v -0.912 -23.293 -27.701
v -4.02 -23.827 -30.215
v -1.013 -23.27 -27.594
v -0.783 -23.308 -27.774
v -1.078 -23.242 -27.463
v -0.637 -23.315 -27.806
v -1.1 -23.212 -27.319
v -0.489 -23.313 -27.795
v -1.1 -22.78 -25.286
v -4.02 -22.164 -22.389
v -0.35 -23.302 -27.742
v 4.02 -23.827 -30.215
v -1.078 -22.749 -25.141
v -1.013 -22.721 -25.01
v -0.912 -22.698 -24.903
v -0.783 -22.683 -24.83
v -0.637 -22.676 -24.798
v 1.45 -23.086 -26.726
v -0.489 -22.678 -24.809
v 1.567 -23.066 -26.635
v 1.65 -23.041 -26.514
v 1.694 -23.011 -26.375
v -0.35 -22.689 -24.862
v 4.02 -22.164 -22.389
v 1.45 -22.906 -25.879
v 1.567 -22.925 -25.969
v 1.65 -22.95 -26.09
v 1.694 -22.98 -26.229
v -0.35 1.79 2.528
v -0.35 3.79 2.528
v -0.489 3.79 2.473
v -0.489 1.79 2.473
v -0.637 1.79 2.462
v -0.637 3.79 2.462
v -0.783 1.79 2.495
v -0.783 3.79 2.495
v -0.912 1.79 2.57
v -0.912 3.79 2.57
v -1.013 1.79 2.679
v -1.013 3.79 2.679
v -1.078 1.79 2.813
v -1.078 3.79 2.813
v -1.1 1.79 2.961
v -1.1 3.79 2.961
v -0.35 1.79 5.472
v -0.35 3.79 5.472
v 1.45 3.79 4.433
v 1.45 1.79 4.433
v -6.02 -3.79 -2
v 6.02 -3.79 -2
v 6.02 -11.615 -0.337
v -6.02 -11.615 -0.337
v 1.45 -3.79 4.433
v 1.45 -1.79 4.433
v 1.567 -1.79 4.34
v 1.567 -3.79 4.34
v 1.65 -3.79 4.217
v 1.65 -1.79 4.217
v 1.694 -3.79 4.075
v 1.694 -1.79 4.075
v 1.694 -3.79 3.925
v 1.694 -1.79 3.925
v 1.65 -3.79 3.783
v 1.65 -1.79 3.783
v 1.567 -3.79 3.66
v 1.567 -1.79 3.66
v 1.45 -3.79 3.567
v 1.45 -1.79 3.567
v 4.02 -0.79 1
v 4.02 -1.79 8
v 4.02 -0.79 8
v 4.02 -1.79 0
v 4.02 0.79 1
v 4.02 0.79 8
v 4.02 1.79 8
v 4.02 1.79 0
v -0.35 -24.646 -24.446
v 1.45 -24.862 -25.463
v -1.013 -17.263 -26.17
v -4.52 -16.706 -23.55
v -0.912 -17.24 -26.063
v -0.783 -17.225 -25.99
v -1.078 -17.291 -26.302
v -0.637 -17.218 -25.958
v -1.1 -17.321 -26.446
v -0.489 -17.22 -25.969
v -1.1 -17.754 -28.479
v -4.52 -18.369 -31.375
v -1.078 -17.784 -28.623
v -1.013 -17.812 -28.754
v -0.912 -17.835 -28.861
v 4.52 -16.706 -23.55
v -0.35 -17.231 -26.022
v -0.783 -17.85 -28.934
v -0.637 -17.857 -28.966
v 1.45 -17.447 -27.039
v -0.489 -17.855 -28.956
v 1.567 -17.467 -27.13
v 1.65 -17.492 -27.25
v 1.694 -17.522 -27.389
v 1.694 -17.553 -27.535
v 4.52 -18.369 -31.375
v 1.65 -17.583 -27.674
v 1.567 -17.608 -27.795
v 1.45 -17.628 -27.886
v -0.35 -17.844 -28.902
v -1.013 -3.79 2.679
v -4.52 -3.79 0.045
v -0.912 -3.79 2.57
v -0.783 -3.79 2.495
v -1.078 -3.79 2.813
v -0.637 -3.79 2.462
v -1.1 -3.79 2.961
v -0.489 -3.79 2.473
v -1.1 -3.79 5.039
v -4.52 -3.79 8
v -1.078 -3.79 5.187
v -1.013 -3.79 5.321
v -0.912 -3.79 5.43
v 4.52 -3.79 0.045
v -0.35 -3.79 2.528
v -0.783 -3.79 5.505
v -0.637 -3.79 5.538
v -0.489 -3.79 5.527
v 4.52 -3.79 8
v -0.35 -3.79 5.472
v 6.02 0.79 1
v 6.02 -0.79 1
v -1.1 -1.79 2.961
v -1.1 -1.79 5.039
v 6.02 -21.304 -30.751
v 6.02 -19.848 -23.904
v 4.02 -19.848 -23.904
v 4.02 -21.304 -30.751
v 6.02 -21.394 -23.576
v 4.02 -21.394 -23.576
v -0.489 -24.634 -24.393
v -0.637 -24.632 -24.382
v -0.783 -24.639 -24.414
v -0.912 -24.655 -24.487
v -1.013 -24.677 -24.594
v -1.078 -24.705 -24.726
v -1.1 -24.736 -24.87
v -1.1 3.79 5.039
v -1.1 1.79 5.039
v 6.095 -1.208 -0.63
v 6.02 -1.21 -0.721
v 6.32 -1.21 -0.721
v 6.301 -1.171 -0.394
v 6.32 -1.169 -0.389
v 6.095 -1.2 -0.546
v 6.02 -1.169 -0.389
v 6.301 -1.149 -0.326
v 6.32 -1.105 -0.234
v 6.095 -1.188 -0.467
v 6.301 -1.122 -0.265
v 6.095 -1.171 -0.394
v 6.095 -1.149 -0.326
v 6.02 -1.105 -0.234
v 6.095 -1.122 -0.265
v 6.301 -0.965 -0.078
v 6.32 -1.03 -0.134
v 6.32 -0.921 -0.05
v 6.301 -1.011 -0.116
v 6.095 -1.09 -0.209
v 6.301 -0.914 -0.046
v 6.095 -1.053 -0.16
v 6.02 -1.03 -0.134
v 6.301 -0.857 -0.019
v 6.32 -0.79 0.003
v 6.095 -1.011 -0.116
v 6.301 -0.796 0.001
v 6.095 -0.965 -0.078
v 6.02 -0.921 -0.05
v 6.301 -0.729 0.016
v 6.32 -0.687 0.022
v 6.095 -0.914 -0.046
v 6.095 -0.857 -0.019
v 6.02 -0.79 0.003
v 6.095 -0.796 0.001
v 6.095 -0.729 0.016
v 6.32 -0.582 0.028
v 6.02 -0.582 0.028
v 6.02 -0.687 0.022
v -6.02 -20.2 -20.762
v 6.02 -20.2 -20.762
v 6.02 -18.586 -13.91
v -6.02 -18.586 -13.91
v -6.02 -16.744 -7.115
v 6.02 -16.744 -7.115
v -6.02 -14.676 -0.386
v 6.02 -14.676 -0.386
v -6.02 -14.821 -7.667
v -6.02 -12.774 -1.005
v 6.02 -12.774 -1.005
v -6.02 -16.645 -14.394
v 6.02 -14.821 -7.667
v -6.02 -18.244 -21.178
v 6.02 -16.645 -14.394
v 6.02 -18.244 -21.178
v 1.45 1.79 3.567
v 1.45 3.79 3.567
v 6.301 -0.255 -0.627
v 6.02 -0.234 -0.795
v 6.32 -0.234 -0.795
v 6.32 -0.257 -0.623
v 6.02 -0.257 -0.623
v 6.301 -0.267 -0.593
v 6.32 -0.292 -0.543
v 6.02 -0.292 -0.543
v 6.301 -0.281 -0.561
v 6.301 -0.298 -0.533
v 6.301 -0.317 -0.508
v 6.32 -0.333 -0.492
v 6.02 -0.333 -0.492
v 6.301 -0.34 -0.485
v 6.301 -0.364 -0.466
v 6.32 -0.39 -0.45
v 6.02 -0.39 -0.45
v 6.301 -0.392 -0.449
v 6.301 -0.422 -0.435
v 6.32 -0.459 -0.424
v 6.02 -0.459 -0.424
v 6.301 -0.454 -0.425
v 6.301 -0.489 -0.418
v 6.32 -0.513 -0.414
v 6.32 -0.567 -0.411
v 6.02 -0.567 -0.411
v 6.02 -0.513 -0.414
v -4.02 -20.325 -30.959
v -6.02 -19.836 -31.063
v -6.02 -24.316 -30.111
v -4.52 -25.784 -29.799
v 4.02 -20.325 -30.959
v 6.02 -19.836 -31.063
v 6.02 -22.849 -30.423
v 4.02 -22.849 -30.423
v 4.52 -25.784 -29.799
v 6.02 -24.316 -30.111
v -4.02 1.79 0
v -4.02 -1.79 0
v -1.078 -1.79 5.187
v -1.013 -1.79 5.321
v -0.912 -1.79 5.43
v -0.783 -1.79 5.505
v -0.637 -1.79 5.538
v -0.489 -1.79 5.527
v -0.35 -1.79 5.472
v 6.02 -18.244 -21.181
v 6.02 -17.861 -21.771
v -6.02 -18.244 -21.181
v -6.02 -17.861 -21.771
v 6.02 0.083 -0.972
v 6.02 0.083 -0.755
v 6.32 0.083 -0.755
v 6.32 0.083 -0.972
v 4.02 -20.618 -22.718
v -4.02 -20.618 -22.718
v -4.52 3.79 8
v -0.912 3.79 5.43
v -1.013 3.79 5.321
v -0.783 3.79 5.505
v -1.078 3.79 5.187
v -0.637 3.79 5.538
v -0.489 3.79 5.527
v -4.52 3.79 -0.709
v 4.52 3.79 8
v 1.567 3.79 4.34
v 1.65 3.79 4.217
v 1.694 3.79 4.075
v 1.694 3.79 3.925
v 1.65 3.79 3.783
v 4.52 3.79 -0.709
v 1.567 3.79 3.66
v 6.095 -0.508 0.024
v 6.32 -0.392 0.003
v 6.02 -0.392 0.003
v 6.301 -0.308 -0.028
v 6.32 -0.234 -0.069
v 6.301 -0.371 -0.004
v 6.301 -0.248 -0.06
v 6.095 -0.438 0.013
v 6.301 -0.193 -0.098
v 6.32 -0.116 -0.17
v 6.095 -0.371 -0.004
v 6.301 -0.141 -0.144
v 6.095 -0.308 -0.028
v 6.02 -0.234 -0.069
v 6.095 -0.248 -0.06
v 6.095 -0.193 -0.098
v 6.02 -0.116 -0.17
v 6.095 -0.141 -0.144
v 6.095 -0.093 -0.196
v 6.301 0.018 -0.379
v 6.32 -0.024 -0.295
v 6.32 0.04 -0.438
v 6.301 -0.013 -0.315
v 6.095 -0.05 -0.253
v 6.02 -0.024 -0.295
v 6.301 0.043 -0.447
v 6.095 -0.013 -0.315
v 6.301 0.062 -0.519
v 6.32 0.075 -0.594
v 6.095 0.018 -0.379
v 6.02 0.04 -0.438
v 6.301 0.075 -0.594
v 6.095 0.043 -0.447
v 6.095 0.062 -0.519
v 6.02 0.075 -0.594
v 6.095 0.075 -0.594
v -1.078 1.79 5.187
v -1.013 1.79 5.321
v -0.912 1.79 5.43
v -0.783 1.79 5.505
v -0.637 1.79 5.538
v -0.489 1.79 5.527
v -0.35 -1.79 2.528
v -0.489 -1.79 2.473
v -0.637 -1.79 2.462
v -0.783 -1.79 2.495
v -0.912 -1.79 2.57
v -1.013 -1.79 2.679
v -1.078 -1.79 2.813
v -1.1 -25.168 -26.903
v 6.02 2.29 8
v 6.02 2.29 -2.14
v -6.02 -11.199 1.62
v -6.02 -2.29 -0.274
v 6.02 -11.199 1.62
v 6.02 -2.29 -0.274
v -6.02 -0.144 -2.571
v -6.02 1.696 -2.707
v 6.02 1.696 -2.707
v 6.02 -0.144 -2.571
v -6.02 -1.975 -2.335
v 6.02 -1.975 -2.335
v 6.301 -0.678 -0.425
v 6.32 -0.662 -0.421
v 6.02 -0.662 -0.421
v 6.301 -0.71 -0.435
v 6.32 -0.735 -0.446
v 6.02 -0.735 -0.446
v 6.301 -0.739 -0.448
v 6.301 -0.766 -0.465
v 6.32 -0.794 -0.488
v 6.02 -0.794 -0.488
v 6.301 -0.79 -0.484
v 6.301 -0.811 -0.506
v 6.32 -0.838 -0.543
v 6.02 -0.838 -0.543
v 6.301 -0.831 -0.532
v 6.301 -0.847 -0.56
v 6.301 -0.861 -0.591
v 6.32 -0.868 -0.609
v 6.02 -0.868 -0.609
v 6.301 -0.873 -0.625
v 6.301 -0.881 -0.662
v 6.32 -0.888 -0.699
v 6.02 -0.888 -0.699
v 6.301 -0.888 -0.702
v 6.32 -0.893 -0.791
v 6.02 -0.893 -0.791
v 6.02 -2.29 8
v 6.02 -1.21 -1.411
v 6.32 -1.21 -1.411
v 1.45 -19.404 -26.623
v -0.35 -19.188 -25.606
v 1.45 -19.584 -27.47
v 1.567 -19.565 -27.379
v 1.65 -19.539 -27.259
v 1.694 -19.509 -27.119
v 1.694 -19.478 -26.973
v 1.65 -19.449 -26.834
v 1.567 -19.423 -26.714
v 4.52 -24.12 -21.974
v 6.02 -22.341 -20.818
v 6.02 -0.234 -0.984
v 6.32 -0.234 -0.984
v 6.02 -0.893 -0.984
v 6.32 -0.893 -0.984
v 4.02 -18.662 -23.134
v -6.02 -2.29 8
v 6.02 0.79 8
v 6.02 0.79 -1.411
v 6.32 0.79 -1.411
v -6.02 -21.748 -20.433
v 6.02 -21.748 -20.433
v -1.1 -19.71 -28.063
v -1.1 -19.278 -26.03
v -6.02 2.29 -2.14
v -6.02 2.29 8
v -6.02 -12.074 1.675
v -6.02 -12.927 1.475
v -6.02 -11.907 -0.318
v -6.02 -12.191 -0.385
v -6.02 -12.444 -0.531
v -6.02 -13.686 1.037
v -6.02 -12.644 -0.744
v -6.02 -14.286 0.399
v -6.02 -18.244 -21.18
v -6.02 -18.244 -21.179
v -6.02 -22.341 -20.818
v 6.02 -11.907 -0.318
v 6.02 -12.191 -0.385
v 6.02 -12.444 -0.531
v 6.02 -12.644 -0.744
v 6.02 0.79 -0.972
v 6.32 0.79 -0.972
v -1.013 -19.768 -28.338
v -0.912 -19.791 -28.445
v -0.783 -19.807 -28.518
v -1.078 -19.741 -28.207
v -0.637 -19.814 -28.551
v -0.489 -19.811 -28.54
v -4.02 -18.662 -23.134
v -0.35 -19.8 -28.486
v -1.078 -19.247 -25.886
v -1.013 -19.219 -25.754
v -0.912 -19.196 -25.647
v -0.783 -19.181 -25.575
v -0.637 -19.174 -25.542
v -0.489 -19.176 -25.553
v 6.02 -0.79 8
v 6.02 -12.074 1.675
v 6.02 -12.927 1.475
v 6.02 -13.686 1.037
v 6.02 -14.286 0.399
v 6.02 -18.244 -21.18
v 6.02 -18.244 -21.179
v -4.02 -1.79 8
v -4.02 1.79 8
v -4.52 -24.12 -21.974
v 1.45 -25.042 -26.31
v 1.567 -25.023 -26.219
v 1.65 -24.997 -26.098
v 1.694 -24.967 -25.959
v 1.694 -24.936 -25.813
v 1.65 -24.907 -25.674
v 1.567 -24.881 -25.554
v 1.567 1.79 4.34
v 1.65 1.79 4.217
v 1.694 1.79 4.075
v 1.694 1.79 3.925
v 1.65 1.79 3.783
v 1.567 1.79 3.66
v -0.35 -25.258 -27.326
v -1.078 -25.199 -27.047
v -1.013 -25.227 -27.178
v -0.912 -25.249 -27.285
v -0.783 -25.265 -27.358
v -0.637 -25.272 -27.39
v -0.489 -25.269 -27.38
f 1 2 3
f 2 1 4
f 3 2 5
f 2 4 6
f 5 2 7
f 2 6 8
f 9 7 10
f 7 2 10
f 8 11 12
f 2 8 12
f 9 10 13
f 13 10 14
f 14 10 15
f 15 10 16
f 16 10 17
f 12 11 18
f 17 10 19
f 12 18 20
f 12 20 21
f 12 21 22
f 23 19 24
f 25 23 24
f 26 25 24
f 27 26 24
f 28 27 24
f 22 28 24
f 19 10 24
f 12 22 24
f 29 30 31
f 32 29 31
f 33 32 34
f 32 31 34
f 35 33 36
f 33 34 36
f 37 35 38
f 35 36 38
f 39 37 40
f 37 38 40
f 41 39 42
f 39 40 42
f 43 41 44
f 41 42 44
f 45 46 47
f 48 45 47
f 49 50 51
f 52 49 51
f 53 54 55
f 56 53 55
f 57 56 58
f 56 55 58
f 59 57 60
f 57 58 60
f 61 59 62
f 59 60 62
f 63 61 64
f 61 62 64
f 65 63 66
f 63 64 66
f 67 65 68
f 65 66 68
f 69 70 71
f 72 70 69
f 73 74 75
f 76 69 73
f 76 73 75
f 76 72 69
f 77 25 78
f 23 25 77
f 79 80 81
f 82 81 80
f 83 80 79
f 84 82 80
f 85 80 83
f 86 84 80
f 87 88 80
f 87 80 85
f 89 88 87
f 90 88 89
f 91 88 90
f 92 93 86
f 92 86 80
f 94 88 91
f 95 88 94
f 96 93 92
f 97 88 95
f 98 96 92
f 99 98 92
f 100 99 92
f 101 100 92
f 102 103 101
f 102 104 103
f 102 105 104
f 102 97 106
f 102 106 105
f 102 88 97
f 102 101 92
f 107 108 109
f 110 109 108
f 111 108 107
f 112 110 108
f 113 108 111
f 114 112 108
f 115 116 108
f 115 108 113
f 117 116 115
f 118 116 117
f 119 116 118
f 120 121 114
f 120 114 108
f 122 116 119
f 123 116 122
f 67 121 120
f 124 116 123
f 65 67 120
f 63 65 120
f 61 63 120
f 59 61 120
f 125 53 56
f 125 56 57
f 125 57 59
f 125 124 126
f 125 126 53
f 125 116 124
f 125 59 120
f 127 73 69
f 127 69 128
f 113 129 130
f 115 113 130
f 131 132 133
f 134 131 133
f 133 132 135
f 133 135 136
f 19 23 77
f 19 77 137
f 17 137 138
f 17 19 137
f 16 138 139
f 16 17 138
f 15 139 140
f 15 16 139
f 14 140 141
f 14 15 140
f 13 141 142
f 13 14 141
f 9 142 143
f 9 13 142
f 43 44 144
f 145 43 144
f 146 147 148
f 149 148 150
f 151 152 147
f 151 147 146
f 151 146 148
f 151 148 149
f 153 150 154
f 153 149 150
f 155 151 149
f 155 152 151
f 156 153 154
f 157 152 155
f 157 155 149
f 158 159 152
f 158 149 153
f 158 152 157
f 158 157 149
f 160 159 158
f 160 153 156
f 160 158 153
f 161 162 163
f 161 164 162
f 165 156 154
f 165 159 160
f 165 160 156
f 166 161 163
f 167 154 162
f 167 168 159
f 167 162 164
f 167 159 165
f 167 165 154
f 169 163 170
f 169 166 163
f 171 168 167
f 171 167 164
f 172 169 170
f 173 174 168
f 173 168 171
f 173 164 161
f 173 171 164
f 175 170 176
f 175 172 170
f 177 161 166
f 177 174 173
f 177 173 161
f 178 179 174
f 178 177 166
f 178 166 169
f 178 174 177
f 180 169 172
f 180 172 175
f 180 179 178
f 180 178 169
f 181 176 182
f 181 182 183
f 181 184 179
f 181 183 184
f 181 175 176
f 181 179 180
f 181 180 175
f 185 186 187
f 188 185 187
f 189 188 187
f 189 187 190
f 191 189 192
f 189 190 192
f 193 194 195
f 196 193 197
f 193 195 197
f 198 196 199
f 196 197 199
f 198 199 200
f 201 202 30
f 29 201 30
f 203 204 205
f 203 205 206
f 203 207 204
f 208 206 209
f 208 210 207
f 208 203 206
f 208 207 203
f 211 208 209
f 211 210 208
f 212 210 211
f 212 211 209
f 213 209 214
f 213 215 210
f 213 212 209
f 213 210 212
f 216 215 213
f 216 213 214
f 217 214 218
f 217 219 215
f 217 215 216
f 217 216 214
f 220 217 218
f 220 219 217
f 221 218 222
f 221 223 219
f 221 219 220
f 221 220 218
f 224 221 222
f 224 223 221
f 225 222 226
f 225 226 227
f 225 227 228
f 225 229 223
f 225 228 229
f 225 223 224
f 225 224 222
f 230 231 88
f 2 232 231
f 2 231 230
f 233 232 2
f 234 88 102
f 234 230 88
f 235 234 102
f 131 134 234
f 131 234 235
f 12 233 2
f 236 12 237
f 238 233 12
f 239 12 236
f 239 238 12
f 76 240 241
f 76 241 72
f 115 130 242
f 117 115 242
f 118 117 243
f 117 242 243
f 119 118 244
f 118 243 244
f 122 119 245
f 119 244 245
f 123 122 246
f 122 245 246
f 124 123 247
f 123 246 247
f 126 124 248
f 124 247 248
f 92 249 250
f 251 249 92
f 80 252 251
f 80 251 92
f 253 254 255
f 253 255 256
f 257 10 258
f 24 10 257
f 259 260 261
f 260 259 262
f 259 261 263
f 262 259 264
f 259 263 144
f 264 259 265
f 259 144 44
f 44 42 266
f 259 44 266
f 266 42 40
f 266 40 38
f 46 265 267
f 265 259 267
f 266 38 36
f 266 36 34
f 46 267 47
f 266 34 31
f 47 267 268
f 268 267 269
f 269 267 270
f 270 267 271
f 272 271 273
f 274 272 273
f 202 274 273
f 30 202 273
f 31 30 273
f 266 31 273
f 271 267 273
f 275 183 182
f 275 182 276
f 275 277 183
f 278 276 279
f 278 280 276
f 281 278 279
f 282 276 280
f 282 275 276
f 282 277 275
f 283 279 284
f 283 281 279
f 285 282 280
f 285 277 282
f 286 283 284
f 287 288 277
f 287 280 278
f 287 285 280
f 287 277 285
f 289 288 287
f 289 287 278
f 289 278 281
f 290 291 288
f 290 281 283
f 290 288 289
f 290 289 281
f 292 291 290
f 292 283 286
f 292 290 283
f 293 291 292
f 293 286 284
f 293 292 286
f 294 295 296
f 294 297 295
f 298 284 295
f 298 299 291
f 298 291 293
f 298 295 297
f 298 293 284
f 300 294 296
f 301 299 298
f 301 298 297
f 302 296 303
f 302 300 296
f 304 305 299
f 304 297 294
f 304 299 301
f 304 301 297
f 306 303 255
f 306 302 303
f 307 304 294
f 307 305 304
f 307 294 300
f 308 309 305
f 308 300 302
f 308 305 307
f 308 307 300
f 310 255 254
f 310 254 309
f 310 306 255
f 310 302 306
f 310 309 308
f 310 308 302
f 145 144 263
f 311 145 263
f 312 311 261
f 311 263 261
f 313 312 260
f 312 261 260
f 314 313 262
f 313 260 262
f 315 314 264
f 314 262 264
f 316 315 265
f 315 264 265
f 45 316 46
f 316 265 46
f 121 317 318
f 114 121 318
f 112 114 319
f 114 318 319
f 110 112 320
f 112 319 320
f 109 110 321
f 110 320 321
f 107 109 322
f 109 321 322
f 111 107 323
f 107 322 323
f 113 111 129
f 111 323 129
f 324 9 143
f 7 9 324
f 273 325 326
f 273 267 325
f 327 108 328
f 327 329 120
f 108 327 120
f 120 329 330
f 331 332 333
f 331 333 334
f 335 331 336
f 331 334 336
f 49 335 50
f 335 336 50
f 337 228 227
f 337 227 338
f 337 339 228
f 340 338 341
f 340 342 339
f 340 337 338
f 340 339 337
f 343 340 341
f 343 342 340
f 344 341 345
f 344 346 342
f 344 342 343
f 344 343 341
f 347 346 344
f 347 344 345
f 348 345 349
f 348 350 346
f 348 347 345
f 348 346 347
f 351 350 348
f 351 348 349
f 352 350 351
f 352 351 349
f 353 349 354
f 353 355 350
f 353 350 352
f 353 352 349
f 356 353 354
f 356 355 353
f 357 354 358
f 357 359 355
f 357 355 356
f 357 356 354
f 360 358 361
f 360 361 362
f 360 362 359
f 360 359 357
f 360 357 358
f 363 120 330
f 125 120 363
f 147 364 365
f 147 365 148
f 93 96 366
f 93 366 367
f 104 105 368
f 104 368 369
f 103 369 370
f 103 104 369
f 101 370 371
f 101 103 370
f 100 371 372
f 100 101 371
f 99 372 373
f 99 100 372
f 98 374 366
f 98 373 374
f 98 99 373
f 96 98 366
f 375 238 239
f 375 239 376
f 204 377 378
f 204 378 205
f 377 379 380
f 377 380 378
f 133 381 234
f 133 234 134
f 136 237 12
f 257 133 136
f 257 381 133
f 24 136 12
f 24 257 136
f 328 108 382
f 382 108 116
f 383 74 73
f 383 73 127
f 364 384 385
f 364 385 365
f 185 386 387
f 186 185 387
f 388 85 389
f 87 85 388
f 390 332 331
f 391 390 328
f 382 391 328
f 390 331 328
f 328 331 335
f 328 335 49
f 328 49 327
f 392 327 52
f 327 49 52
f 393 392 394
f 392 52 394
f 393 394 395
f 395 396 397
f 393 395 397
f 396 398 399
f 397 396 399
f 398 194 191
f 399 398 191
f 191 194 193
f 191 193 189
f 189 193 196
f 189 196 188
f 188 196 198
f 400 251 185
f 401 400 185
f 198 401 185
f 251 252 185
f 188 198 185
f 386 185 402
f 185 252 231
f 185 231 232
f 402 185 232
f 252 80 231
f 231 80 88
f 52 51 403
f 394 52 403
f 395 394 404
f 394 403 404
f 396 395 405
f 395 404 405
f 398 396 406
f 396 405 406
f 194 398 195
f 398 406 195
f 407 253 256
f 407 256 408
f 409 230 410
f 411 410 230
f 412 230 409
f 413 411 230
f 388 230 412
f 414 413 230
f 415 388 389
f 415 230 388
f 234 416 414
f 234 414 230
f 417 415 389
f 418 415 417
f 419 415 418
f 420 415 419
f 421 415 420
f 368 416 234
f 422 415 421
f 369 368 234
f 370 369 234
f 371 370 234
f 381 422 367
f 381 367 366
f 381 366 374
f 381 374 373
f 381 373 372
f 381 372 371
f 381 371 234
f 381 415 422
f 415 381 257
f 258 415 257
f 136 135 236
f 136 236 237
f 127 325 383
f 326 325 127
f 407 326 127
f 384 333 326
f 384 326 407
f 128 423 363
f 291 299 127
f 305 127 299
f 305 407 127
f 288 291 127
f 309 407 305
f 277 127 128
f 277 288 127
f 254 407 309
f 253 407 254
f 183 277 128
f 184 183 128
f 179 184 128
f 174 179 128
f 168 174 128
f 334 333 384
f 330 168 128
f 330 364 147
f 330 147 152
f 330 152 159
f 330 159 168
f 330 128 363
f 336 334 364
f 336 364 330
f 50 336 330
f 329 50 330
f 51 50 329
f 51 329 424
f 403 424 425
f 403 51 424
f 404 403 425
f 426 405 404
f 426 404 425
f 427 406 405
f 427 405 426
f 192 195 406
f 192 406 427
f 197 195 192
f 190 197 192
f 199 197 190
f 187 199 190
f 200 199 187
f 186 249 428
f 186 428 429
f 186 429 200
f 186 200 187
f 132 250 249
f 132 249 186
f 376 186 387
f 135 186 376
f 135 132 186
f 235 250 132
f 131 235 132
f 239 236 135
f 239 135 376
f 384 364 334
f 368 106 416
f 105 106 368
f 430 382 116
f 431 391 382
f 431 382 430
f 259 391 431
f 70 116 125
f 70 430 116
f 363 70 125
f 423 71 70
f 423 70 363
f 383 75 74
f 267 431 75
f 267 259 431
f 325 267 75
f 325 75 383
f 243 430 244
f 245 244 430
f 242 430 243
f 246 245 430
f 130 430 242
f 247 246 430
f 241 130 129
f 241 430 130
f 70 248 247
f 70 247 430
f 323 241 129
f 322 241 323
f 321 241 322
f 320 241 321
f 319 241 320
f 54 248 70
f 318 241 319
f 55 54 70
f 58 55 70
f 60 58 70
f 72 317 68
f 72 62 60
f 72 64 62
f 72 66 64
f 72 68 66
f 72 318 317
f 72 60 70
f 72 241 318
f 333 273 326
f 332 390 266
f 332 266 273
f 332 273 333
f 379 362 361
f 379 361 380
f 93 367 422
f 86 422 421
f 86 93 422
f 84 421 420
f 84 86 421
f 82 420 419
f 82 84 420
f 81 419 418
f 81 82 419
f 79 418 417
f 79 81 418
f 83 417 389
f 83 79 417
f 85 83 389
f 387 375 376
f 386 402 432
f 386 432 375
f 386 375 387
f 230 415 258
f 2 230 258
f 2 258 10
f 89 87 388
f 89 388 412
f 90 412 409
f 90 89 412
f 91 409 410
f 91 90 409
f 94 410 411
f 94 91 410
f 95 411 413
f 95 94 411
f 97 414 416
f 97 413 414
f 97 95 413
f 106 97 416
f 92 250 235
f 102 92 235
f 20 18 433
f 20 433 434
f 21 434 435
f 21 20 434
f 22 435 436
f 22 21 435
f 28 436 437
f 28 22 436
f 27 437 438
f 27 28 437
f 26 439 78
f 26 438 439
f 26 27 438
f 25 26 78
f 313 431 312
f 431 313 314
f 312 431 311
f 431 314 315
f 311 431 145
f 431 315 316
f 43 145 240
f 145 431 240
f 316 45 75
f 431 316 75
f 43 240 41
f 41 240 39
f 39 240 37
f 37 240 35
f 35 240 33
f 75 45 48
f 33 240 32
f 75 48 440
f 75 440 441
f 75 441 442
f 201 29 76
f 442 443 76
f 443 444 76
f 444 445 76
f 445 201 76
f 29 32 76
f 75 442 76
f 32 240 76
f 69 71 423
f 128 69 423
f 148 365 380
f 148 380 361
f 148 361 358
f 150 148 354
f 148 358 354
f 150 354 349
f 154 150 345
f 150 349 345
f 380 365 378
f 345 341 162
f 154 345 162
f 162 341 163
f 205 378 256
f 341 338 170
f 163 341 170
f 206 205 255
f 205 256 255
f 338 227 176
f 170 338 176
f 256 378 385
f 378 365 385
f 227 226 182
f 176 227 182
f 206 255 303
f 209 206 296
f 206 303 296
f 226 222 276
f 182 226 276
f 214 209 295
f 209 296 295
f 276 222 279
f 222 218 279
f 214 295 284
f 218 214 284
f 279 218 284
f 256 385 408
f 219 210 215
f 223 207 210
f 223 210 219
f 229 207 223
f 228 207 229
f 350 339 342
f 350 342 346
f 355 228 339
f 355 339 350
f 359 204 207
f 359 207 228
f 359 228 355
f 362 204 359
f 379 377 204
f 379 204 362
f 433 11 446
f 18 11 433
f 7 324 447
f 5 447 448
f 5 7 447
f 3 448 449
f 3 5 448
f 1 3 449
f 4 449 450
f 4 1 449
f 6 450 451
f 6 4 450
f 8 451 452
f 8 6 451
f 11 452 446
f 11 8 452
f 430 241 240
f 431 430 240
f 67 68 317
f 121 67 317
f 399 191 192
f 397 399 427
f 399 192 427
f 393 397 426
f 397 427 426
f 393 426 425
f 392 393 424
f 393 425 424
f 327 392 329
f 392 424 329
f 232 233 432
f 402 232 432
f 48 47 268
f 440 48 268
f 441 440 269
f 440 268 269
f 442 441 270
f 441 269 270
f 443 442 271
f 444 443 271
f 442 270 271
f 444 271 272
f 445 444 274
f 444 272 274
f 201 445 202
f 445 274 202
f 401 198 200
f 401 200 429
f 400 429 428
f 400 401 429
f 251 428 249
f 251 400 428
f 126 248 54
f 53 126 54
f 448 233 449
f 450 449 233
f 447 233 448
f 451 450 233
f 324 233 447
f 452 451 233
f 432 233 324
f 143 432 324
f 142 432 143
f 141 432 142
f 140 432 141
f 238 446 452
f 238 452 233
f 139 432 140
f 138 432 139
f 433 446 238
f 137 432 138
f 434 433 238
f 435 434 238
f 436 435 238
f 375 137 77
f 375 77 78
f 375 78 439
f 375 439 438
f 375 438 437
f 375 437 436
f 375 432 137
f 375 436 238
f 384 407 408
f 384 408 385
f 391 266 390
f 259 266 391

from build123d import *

# Parameters (mm, degrees)
SKETCH1_W                      = 12.04
SKETCH1_H                      = 7.58
SKETCH1_W_2                    = 8.04
SKETCH1_H_2                    = 3.58
BOSS_EXTRUDE1_DEPTH            = 8
SKETCH1_2_W                    = 12.04
SKETCH1_2_H                    = 7.58
SKETCH1_2_W_2                  = 8.04
SKETCH1_2_H_2                  = 3.58
BOSS_EXTRUDE2_DEPTH            = 2
EXTRUDE_THIN1_DEPTH            = 12.04
SKETCH5_W                      = 12.04
SKETCH5_H                      = 7.58
SKETCH5_W_2                    = 8.04
SKETCH5_H_2                    = 3.58
BOSS_EXTRUDE4_DEPTH            = 8
SKETCH5_4_W                    = 12.04
SKETCH5_4_H                    = 7.58
BOSS_EXTRUDE5_DEPTH            = 2
CHAMFER1_SIZE                  = 1.5
CHAMFER2_START                 = -7
CHAMFER2_DEPTH                 = 14
CUT_EXTRUDE1_REACH             = 45.534
CUT_EXTRUDE1_DIRECTION_2_DEPTH = 44.534029429
CUT_EXTRUDE2_DEPTH             = 43.263143381
CUT_EXTRUDE2_DEPTH_BACK        = 43.263143381
SKETCH8_W                      = 2
SKETCH8_H                      = 1.58
CUT_EXTRUDE3_DEPTH             = 7
SKETCH9_W                      = 4
SKETCH9_H                      = 1.58
CUT_EXTRUDE4_DEPTH             = 7
BOSS_EXTRUDE7_DEPTH            = 0.3


with BuildPart() as part:
    # Sketch1 → Boss-Extrude1 (new body)
    with BuildSketch(Plane.XY):
        Rectangle(SKETCH1_W, SKETCH1_H)
        Rectangle(SKETCH1_W_2, SKETCH1_H_2, mode=Mode.SUBTRACT)
    extrude(amount=BOSS_EXTRUDE1_DEPTH)

    # Sketch1<2> → Boss-Extrude2 (add)
    # profile 1 of 2: a face of its own
    with BuildSketch(Plane.XY):
        Rectangle(SKETCH1_2_W, SKETCH1_2_H)
        Rectangle(SKETCH1_2_W_2, SKETCH1_2_H_2, mode=Mode.SUBTRACT)
    # profile 2 of 2: a face of its own
    with BuildSketch(Plane.XY):
        Rectangle(SKETCH1_2_W_2, SKETCH1_2_H_2)
    extrude(amount=-BOSS_EXTRUDE2_DEPTH)

    # Sketch3 → Extrude-Thin1 (add)
    with BuildSketch(Plane(origin=(6.02, 9.81, 0), x_dir=(0, -1, 0), z_dir=(1, 0, 0))):
        with BuildLine():
            Line((6.02, 2.744137986), (6.52, 2.744137986))
            ThreePointArc((6.52, 2.744137986), (10.07949931, 2.557592532), (13.6, 2))
            Line((13.6, 2), (21.425180806, 0.336706473))
            ThreePointArc((21.425180806, 0.336706473), (22.132801564, 0.448660765), (22.583941196, 1.005198215))
            ThreePointArc((22.583941196, 1.005198215), (25.714510404, 11.554301253), (28.285098031, 22.253652529))
            Line((28.285098031, 22.253652529), (28.472176136, 23.133785819))
            Line((28.472176136, 23.133785819), (30.428471338, 22.717962437))
            Line((30.428471338, 22.717962437), (30.241393232, 21.837829148))
            ThreePointArc((30.241393232, 21.837829148), (27.646188069, 11.036014268), (24.485638594, 0.385886497))
            ThreePointArc((24.485638594, 0.385886497), (23.132219698, -1.283725852), (21.009357424, -1.619588728))
            Line((21.009357424, -1.619588728), (13.184176618, 0.043704799))
            ThreePointArc((13.184176618, 0.043704799), (9.870442383, 0.568548741), (6.52, 0.744137986))
            Line((6.52, 0.744137986), (6.02, 0.744137986))
            Line((6.02, 0.744137986), (6.02, 2.744137986))
        make_face()
    extrude(amount=-EXTRUDE_THIN1_DEPTH)



with BuildPart() as body_2:
    # Sketch5 → Boss-Extrude4 (new body)
    with BuildSketch(Plane(origin=(0, 485.418561105, -130.279454131), x_dir=(1, 0, 0), z_dir=(0, -0.20791169081775487, -0.9781476007338067))):
        with Locations((0, 517.132200771)):
            Rectangle(SKETCH5_W, SKETCH5_H)
        with Locations((0, 517.132200771)):
            Rectangle(SKETCH5_W_2, SKETCH5_H_2, mode=Mode.SUBTRACT)
    extrude(amount=BOSS_EXTRUDE4_DEPTH)


with BuildPart() as part_1:
    add(part.part)

    add(body_2.part)  # Boss-Extrude5 merges body 2
    # Sketch5<4> → Boss-Extrude5 (add)
    with BuildSketch(Plane(origin=(0, 485.418561105, -130.279454131), x_dir=(1, 0, 0), z_dir=(0, -0.20791169081775487, -0.9781476007338067))):
        with Locations((0, 517.132200771)):
            Rectangle(SKETCH5_4_W, SKETCH5_4_H)
    extrude(amount=-BOSS_EXTRUDE5_DEPTH)

    # Chamfer1
    chamfer1_edges = [part_1.edges().sort_by_distance(p)[0] for p in [
        (6.02, -24.743974821, -24.908081386),
        (-6.02, -24.743974821, -24.908081386),
        (6.02, 3.79, 2.627931007),
        (6.02, -3.79, 4.022340595),
        (-6.02, -3.79, 4.022340595),
        (-6.02, 3.79, 2.627931007),
        (6.02, -17.329616007, -26.484052003),
        (-6.02, -17.329616007, -26.484052003),
    ]]
    chamfer(chamfer1_edges, length=CHAMFER1_SIZE)

    # Chamfer2: read off the stored shape, not the designer's step
    # Chamfer2 outline → Chamfer2 (cut)
    with BuildSketch(Plane.YZ.offset(CHAMFER2_START)):
        with BuildLine():
            Line((3.79, -2.744137986), (3.79, -0.709020541))
            Line((3.79, -0.709020541), (1.696404781, -2.706829325))
            ThreePointArc((1.696404781, -2.706829325), (2.492984056, -2.734809543), (3.29, -2.744137986))
            Line((3.29, -2.744137986), (3.79, -2.744137986))
        make_face()
        Polygon((-23.704416367, -20.017343383), (-24.120239749, -21.973638584), (-21.748121165, -20.433166764), align=None)
        with BuildLine():
            ThreePointArc((-18.243518062, -21.17809315), (-18.243825174, -21.1795015), (-18.244132277, -21.180909853))
            Line((-18.244132277, -21.180909853), (-16.705880935, -23.549609201))
            Line((-16.705880935, -23.549609201), (-16.290057553, -21.593313999))
            Line((-16.290057553, -21.593313999), (-18.243518062, -21.17809315))
        make_face()
    extrude(amount=CHAMFER2_DEPTH, mode=Mode.SUBTRACT)

    # Cut-Extrude1: up to this face of the body (flat: up to its plane)
    cut_extrude1_end = Plane(part_1.part.faces().sort_by_distance((0, -3.79, 4.022340595))[0])
    # Sketch6 → Cut-Extrude1 (cut, up to the picked face)
    with BuildSketch(Plane(origin=(0, 3.79, 0), x_dir=(1, 0, 0), z_dir=(0, 1, 0)), mode=Mode.PRIVATE) as cut_extrude1_sk1:
        with BuildLine():
            Line((1.45, -3.566987298), (-0.35, -2.527756814))
            ThreePointArc((-0.35, -2.527756814), (-0.85, -2.527756814), (-1.1, -2.960769515))
            Line((-1.1, -2.960769515), (-1.1, -5.039230485))
            ThreePointArc((-1.1, -5.039230485), (-0.85, -5.472243186), (-0.35, -5.472243186))
            Line((-0.35, -5.472243186), (1.45, -4.433012702))
            ThreePointArc((1.45, -4.433012702), (1.7, -4), (1.45, -3.566987298))
        make_face()
    cut_extrude1_tool1 = split(extrude(cut_extrude1_sk1.sketch, amount=-CUT_EXTRUDE1_REACH, mode=Mode.PRIVATE), bisect_by=cut_extrude1_end, keep=Keep.BOTH, mode=Mode.PRIVATE)
    add(cut_extrude1_tool1.solids().sort_by(Axis((0, 3.79, 4), (0, -1, 0)))[0], mode=Mode.SUBTRACT)

    # Sketch6 → Cut-Extrude1 direction 2 (cut)
    with BuildSketch(Plane(origin=(0, 3.79, 0), x_dir=(1, 0, 0), z_dir=(0, 1, 0))):
        with BuildLine():
            Line((1.45, -3.566987298), (-0.35, -2.527756814))
            ThreePointArc((-0.35, -2.527756814), (-0.85, -2.527756814), (-1.1, -2.960769515))
            Line((-1.1, -2.960769515), (-1.1, -5.039230485))
            ThreePointArc((-1.1, -5.039230485), (-0.85, -5.472243186), (-0.35, -5.472243186))
            Line((-0.35, -5.472243186), (1.45, -4.433012702))
            ThreePointArc((1.45, -4.433012702), (1.7, -4), (1.45, -3.566987298))
        make_face()
    extrude(amount=CUT_EXTRUDE1_DIRECTION_2_DEPTH, mode=Mode.SUBTRACT)

    # Sketch7 → Cut-Extrude2 (cut, two sides: drawn at the far end of the back side and taken through both)
    with BuildSketch(Plane(origin=(0, -18.608845607, 3.955432239), x_dir=(1, 0, 0), z_dir=(0, -0.9781476007338067, 0.2079116908177549)).offset(-CUT_EXTRUDE2_DEPTH_BACK)):
        with BuildLine():
            Line((1.45, -30.075328988), (-0.35, -29.036098503))
            ThreePointArc((-0.35, -29.036098503), (-0.85, -29.036098503), (-1.1, -29.469111205))
            Line((-1.1, -29.469111205), (-1.1, -31.547572174))
            ThreePointArc((-1.1, -31.547572174), (-0.85, -31.980584876), (-0.35, -31.980584876))
            Line((-0.35, -31.980584876), (1.45, -30.941354391))
            ThreePointArc((1.45, -30.941354391), (1.7, -30.508341689), (1.45, -30.075328988))
        make_face()
    extrude(amount=CUT_EXTRUDE2_DEPTH + CUT_EXTRUDE2_DEPTH_BACK, mode=Mode.SUBTRACT)

    # Sketch8 → Cut-Extrude3 (cut)
    with BuildSketch(Plane.XY.offset(8)):
        with Locations((5.02, 0)):
            Rectangle(SKETCH8_W, SKETCH8_H)
    extrude(amount=-CUT_EXTRUDE3_DEPTH, mode=Mode.SUBTRACT)

    # Sketch9 → Cut-Extrude4 (cut)
    with BuildSketch(Plane(origin=(0, -7.174687668, -33.754251629), x_dir=(-1, 0, 0), z_dir=(0, -0.20791169081775673, -0.9781476007338064))):
        with Locations((-6.02, -15.234578288)):
            Rectangle(SKETCH9_W, SKETCH9_H)
    extrude(amount=-CUT_EXTRUDE4_DEPTH, mode=Mode.SUBTRACT)

    # Sketch11 → Boss-Extrude7 (add)
    with BuildSketch(Plane(origin=(6.02, 0, -6.02), x_dir=(0, 0, 1), z_dir=(-1, 0, 0))):
        with BuildLine():
            Line((5.047536003, 0.082682927), (5.047536003, 0.79))
            Line((5.047536003, 0.79), (4.608511613, 0.79))
            Line((4.608511613, 0.79), (4.608511613, -1.21))
            Line((4.608511613, -1.21), (5.299060394, -1.21))
            add(Edge.make_bspline(
                [(5.299060394, -1.21), (5.329313952, -1.209669089), (5.387892505, -1.20902836), (5.472763934, -1.201041655), (5.551912875, -1.189213366), (5.625349672, -1.172100798), (5.693083305, -1.150229064), (5.754766894, -1.122952683), (5.811034602, -1.091546463), (5.860787755, -1.054159212), (5.905113914, -1.0123961), (5.943543862, -0.965606031), (5.975708858, -0.913602215), (6.002058422, -0.856769543), (6.02273613, -0.795055664), (6.036919265, -0.728309994), (6.045834622, -0.656886984), (6.046958484, -0.607639268), (6.047536003, -0.582332317)],
                knots=[0, 0, 0, 0, 1.298309684, 2.513856393, 3.656108695, 4.731525363, 5.747269452, 6.706842141, 7.622696522, 8.50723259, 9.371308978, 10.231556582, 11.09863924, 11.989139744, 12.915198226, 13.88644584, 14.913906774, 16, 16, 16, 16], degree=3))
            add(Edge.make_bspline(
                [(6.047536003, -0.582332317), (6.046958026, -0.557515305), (6.045826057, -0.50891113), (6.034579341, -0.43810911), (6.01784318, -0.370657155), (5.992755465, -0.307388849), (5.96129274, -0.247554648), (5.922654871, -0.191755979), (5.876715772, -0.140008785), (5.824737087, -0.092263463), (5.76741001, -0.049357043), (5.705904977, -0.012393475), (5.640949178, 0.01871881), (5.572580865, 0.043912433), (5.500609023, 0.062967718), (5.425113901, 0.075859677), (5.346196751, 0.08276557), (5.2924674, 0.082710787), (5.265142711, 0.082682927)],
                knots=[0, 0, 0, 0, 1.030031435, 2.017318961, 2.9707634, 3.911434012, 4.836705747, 5.773461207, 6.723043161, 7.705184701, 8.700351159, 9.692154612, 10.681034209, 11.68770297, 12.714187277, 13.76904456, 14.865421547, 16, 16, 16, 16], degree=3))
            Line((5.265142711, 0.082682927), (5.047536003, 0.082682927))
        make_face()
        with BuildLine():
            Line((5.036103077, -0.892926829), (5.036103077, -0.234390244))
            Line((5.036103077, -0.234390244), (5.224746369, -0.234390244))
            add(Edge.make_bspline(
                [(5.224746369, -0.234390244), (5.240257069, -0.234519065), (5.270324289, -0.234768783), (5.313827436, -0.239266362), (5.354507641, -0.245501395), (5.39208054, -0.254654559), (5.426930993, -0.265974439), (5.458434732, -0.280437451), (5.487059955, -0.297407138), (5.512929634, -0.316804387), (5.535224382, -0.339455254), (5.555117628, -0.364216963), (5.571992729, -0.391655317), (5.585050634, -0.422099729), (5.596087863, -0.45462628), (5.602917978, -0.490012993), (5.607750907, -0.527828853), (5.608252881, -0.553986887), (5.608511613, -0.567469512)],
                knots=[0, 0, 0, 0, 1.278264899, 2.477894098, 3.602370215, 4.669373304, 5.663063542, 6.619223296, 7.520996807, 8.402964925, 9.276935434, 10.134111266, 11.017943356, 11.922995833, 12.86038281, 13.844364746, 14.88892179, 16, 16, 16, 16], degree=3))
            add(Edge.make_bspline(
                [(5.608511613, -0.567469512), (5.608243066, -0.580569264), (5.607719879, -0.606090356), (5.602979451, -0.643045607), (5.595872643, -0.677668866), (5.585733194, -0.709706236), (5.572188175, -0.739091862), (5.555687516, -0.765952955), (5.536368124, -0.790420284), (5.513666923, -0.811964985), (5.488692805, -0.831640584), (5.459986472, -0.847894241), (5.428669687, -0.862115985), (5.394268426, -0.873426519), (5.357002183, -0.882096268), (5.316907649, -0.888585203), (5.273728574, -0.892402235), (5.243936115, -0.892748228), (5.228557345, -0.892926829)],
                knots=[0, 0, 0, 0, 1.096807385, 2.136813243, 3.115574441, 4.054422268, 4.94474187, 5.818891163, 6.689666352, 7.547538513, 8.435055958, 9.345744162, 10.302983784, 11.312439221, 12.373194966, 13.505006157, 14.712092391, 16, 16, 16, 16], degree=3))
            Line((5.228557345, -0.892926829), (5.036103077, -0.892926829))
        make_face(mode=Mode.SUBTRACT)
    extrude(amount=-BOSS_EXTRUDE7_DEPTH)


solid = part_1.part
